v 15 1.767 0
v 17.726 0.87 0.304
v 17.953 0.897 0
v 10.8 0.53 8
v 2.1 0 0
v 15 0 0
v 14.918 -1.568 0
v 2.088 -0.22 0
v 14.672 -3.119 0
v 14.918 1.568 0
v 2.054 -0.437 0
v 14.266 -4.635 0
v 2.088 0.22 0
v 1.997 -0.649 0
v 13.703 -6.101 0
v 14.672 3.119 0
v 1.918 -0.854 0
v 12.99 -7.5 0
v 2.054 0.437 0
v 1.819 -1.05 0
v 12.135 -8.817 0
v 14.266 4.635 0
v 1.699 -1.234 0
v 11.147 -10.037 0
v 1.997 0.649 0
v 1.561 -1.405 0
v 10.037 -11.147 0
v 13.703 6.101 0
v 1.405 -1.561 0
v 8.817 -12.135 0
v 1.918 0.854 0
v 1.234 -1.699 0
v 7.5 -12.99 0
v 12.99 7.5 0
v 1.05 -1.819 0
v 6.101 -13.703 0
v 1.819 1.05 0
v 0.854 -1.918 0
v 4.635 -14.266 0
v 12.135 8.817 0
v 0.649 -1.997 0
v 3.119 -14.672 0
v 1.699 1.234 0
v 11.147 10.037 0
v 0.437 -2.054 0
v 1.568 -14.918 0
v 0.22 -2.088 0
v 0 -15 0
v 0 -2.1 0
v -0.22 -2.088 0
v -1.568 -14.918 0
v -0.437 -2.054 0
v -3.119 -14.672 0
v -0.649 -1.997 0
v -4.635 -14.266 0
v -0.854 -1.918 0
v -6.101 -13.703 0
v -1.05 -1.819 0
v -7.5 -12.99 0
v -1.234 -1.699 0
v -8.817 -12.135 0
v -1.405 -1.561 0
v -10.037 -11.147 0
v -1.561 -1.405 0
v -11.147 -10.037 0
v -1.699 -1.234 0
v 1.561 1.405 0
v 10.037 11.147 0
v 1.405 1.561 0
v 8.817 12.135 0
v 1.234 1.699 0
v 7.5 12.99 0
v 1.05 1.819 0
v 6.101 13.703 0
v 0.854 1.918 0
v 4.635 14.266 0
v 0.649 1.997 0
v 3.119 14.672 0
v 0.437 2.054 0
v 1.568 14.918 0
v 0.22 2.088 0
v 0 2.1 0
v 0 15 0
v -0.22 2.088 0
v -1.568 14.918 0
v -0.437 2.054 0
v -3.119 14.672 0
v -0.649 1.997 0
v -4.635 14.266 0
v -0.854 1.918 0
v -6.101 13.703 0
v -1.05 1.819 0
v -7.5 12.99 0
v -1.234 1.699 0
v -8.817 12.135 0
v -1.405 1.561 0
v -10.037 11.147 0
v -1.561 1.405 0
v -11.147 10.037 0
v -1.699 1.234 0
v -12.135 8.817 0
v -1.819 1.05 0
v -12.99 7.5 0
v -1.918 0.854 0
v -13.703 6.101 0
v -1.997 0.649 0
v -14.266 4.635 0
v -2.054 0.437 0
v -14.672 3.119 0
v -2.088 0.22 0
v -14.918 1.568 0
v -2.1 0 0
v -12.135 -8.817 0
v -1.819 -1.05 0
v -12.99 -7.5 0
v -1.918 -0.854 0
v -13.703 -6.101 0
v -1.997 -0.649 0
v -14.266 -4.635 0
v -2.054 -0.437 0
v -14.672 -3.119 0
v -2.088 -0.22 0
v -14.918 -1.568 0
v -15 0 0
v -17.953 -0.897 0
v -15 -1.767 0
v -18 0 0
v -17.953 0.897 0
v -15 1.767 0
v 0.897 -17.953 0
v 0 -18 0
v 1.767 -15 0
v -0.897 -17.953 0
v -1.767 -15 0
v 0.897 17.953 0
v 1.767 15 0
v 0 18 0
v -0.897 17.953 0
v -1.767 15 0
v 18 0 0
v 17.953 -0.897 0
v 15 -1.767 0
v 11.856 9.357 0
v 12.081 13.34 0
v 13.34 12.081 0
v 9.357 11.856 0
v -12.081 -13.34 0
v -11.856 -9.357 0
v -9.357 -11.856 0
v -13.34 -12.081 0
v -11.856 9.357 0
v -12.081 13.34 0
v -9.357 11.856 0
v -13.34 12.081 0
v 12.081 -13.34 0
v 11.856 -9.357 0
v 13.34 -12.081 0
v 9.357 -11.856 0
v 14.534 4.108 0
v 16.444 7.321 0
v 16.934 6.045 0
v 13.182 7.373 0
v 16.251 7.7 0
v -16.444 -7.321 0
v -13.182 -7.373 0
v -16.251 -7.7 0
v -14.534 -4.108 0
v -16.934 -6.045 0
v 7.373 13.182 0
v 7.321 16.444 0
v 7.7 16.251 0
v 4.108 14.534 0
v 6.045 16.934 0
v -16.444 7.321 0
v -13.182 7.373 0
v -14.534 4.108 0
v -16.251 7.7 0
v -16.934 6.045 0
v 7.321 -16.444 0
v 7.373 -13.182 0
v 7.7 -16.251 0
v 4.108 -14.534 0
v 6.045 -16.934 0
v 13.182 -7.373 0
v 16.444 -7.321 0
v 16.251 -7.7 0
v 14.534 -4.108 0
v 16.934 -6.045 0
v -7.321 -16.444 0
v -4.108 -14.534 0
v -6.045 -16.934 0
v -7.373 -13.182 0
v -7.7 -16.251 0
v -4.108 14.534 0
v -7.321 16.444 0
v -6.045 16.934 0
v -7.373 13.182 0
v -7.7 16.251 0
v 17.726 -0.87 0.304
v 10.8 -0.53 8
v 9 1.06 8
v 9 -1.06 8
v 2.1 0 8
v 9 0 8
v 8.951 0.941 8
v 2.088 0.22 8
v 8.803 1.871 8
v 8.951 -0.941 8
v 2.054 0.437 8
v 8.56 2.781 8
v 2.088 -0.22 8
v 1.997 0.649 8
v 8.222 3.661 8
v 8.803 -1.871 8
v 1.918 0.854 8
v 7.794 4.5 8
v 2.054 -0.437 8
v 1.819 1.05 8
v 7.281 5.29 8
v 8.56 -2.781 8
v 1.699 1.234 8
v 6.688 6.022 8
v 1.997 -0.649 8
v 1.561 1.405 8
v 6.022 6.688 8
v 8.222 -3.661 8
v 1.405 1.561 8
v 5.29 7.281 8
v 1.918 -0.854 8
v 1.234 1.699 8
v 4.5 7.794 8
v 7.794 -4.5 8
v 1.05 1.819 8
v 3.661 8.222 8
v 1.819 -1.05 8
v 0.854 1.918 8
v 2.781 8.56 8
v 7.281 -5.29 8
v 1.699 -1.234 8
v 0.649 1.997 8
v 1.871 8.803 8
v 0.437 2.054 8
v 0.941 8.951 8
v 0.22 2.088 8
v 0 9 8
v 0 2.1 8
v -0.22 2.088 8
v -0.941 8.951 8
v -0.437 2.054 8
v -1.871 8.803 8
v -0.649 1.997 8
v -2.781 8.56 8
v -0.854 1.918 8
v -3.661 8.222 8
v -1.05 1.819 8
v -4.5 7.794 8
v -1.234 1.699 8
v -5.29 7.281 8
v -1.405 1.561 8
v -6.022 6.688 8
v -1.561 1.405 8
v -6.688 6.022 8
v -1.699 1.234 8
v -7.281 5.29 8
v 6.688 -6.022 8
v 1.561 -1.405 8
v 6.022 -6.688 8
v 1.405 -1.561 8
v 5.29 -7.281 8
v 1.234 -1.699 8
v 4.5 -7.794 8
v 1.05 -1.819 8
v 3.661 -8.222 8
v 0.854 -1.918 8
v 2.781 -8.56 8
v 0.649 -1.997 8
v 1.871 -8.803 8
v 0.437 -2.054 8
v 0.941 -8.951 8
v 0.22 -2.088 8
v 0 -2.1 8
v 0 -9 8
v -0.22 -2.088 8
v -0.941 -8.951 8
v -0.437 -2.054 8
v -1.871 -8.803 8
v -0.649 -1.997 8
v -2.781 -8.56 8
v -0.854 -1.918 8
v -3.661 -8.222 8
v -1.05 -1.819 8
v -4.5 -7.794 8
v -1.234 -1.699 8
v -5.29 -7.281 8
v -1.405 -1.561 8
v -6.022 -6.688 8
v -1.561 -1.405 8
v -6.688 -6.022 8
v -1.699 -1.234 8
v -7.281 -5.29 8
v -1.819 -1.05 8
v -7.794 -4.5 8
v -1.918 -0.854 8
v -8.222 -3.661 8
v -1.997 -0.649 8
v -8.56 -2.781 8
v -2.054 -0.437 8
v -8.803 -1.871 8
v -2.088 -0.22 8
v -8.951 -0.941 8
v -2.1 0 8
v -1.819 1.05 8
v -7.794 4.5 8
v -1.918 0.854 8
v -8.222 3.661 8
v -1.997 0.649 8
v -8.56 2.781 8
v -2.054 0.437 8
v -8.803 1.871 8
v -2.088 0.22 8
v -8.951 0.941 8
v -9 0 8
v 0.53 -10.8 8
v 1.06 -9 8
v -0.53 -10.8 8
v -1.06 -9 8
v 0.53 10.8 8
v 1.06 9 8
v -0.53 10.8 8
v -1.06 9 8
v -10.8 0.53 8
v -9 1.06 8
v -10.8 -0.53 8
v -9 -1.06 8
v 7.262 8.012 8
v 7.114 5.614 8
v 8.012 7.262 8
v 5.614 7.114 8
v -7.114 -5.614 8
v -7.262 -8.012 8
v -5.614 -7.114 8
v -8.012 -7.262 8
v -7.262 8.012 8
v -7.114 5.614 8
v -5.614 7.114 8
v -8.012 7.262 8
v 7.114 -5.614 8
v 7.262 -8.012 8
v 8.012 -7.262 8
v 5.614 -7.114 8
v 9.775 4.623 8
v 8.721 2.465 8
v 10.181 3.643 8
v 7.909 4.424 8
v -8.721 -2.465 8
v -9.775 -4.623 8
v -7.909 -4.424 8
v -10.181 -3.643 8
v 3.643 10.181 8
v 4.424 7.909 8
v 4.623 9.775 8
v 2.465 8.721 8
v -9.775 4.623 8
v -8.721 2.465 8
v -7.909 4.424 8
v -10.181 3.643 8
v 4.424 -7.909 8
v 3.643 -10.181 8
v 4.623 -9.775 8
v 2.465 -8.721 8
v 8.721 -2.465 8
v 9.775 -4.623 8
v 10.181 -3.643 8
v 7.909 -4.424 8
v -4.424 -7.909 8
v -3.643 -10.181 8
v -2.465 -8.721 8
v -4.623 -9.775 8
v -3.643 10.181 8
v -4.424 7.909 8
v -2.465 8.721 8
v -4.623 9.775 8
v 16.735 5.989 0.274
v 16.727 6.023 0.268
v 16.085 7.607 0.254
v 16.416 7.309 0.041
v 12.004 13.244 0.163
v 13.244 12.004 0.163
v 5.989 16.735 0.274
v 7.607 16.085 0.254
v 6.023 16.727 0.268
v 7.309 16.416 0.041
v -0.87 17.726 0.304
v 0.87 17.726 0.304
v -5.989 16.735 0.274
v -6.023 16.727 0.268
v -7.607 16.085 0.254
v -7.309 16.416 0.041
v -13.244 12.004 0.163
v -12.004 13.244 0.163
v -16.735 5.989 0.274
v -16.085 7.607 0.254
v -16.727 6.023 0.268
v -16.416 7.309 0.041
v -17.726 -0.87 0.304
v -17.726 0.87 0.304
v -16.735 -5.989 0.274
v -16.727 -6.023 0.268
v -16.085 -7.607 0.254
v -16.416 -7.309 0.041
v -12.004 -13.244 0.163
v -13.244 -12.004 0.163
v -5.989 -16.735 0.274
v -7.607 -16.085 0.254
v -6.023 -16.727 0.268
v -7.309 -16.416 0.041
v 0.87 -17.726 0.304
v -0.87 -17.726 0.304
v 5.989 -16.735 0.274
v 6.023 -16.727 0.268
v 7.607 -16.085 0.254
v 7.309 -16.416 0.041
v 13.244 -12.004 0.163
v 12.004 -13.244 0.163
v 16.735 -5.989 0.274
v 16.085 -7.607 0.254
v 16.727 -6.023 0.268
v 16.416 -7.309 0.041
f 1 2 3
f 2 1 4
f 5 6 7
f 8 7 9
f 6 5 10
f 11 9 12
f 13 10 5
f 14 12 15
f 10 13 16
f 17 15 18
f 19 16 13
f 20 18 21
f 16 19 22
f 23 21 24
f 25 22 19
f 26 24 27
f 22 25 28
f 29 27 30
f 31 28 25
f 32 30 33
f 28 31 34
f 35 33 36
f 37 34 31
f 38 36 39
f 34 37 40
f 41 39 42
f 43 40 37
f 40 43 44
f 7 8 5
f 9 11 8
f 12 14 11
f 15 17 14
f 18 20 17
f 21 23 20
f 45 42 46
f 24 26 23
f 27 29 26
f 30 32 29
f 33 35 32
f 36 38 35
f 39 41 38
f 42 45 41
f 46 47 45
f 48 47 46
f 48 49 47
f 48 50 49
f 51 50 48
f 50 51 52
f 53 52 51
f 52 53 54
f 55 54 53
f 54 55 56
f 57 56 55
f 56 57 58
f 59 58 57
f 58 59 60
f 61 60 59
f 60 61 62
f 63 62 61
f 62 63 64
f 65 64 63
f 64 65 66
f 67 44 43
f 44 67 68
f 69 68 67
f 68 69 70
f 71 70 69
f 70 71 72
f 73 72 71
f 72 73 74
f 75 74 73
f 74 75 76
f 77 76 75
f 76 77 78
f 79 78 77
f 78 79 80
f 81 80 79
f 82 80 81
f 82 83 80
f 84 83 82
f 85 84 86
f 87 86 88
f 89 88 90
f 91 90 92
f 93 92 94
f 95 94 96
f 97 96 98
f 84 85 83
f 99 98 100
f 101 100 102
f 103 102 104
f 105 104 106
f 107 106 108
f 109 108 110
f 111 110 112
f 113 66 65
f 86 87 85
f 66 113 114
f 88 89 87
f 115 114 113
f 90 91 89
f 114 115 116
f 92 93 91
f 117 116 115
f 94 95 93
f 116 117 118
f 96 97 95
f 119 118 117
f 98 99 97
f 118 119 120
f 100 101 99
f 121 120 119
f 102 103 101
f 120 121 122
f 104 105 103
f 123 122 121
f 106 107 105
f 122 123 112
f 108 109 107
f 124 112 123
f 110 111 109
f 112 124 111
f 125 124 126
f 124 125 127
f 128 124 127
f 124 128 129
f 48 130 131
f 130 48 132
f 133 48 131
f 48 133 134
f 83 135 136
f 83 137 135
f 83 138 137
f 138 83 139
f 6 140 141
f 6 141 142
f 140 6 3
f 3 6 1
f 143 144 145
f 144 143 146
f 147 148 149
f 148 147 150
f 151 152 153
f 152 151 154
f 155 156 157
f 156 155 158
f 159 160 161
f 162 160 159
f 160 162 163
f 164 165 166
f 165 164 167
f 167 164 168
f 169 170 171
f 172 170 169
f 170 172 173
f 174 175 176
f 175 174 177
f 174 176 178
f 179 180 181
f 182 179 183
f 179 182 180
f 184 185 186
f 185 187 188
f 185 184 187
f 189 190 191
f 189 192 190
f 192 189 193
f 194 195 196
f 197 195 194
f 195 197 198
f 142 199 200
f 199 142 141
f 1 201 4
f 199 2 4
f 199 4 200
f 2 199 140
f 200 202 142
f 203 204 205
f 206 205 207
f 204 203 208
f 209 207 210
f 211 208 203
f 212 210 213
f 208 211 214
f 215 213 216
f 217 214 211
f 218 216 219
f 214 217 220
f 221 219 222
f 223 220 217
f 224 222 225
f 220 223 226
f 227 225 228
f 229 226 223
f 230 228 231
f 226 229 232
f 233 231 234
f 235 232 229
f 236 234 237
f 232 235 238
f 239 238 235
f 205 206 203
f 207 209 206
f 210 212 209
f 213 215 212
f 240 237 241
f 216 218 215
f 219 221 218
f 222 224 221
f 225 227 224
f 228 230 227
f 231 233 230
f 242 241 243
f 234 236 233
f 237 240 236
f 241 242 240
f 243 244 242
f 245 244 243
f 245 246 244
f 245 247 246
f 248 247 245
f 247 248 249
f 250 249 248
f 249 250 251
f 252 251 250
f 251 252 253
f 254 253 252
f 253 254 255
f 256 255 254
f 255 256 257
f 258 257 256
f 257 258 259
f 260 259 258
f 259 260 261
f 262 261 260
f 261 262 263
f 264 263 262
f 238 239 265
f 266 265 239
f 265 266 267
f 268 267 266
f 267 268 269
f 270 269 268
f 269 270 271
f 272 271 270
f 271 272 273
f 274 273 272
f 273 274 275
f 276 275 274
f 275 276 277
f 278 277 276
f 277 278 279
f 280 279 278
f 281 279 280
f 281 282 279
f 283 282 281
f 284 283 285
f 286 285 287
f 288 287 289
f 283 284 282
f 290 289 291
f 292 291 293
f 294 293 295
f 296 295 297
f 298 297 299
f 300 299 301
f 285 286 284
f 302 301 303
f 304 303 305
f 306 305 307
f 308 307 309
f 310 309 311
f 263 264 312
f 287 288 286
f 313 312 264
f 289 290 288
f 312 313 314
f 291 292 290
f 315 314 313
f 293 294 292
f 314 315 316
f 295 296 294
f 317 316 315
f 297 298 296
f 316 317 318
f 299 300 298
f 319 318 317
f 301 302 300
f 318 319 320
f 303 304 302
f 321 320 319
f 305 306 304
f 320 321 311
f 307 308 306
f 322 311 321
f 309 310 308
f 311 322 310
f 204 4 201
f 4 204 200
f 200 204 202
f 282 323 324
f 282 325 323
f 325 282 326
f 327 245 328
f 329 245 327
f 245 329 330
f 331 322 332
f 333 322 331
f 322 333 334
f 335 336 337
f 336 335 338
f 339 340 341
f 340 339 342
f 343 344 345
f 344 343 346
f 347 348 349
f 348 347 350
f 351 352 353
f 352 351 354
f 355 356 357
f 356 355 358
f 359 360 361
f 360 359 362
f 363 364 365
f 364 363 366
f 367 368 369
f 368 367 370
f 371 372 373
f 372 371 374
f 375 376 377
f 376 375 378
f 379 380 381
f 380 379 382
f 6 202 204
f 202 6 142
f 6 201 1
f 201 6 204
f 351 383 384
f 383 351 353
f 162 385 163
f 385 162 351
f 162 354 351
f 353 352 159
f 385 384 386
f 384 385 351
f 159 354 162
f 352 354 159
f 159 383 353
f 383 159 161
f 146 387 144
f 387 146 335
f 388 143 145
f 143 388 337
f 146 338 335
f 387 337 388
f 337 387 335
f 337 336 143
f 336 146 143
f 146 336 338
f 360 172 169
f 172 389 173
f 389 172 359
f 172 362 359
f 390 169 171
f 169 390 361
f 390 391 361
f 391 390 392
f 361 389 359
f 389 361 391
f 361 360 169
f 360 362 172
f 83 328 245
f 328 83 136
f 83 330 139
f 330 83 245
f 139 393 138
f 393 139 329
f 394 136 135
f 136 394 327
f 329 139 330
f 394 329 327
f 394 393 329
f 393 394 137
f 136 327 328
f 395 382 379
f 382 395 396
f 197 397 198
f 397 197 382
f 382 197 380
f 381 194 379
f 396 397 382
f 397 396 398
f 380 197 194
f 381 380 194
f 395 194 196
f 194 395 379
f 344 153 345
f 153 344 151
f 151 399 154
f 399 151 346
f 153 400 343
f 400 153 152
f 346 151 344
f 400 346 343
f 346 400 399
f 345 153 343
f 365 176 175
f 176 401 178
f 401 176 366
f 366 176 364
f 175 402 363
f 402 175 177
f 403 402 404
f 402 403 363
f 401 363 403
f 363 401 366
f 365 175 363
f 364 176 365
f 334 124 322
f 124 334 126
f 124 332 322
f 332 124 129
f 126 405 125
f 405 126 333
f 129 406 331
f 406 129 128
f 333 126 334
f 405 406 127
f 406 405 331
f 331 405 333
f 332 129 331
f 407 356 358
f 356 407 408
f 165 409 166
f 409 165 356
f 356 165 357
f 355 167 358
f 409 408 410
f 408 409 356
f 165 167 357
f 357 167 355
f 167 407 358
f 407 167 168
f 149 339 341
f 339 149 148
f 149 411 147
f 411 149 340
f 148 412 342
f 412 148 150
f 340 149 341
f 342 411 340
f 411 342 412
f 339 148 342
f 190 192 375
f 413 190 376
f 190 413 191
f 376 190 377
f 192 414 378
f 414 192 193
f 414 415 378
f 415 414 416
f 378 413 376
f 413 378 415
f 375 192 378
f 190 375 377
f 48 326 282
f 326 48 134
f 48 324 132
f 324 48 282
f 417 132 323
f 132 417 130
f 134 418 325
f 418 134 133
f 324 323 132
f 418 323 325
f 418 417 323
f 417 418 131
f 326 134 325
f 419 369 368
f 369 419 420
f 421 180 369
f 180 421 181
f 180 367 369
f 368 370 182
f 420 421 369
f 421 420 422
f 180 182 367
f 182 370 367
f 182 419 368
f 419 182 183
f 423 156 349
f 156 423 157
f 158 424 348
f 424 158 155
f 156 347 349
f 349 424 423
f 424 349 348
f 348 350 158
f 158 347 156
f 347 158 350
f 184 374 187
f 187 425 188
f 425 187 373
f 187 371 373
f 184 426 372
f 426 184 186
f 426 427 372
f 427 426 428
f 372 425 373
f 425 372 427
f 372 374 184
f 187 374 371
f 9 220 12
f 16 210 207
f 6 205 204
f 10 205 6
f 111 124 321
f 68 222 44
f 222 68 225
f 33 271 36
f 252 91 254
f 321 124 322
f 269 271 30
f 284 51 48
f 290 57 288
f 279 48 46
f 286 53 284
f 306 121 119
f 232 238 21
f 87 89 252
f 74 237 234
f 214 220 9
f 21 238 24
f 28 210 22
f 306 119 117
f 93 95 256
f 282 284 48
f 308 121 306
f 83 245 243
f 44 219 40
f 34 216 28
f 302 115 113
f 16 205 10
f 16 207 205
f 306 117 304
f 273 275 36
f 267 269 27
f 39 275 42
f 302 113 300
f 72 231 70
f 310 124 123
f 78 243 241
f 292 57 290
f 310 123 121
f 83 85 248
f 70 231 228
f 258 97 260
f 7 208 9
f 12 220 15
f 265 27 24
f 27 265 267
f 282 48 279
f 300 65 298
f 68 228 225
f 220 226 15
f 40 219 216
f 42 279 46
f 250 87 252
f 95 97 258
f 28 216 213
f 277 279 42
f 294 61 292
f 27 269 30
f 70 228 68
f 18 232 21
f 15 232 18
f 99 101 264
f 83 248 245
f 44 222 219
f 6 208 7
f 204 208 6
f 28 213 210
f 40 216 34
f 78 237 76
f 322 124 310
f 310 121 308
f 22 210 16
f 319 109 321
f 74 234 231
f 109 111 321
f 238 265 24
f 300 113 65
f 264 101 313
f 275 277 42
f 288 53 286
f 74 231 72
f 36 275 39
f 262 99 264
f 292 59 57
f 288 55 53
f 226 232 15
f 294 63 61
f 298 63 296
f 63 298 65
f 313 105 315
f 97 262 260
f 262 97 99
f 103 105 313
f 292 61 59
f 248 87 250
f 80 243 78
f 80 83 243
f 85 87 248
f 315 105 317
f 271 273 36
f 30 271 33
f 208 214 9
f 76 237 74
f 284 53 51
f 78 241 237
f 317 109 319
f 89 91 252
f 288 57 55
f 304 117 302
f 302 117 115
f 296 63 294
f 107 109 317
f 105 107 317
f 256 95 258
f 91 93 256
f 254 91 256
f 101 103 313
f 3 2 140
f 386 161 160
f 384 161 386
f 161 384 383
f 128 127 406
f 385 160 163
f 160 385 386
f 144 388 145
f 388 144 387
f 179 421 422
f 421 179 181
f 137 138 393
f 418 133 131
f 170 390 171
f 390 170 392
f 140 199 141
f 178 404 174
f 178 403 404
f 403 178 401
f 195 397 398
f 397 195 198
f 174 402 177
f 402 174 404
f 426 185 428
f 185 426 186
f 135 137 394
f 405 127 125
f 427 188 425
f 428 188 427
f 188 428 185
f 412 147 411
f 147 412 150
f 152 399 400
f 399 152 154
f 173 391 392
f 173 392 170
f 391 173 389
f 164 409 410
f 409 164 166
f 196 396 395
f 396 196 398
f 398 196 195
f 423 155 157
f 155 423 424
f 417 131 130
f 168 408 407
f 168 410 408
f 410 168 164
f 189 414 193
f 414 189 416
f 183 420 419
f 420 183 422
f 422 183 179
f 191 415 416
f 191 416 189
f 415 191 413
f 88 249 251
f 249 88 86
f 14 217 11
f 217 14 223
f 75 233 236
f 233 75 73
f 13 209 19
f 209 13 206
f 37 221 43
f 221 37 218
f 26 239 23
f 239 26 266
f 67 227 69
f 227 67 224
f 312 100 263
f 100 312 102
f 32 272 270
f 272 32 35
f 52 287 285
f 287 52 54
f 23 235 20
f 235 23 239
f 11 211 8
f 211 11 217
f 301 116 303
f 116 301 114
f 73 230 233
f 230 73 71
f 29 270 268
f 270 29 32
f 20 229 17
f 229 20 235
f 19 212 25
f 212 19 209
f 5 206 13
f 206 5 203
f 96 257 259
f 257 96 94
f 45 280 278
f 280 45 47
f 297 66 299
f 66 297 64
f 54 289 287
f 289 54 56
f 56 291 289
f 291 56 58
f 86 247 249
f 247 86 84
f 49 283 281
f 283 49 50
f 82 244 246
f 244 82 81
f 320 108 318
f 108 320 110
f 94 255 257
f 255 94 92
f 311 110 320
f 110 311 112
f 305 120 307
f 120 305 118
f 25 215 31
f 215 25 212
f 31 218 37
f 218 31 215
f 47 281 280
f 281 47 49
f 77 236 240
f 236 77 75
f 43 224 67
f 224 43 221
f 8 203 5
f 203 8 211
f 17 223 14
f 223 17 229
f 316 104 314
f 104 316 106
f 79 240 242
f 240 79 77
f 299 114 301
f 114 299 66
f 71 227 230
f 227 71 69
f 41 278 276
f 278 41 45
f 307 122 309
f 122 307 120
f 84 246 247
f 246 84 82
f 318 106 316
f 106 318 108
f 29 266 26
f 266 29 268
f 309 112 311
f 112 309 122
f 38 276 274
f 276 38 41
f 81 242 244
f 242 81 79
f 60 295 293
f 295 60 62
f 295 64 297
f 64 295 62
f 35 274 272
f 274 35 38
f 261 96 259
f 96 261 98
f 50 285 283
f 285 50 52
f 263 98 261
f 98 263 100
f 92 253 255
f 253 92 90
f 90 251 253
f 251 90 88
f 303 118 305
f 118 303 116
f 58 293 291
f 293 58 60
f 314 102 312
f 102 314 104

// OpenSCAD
tooth_height = 3;
tooth_count = 16;
tooth_angle = 20;
face_width = 8;
shaft_diameter = 4.2;
gear_diameter = 30;
gear_depth = 12;

upper_diameter = gear_diameter;
lower_diameter = gear_diameter - gear_depth;

$fn = 60;

module bavel_tooth() {
    base_width = PI * upper_diameter / tooth_count * 0.6;
    top_width = PI * upper_diameter / tooth_count * 0.3;
    diameter_ratio = lower_diameter / upper_diameter;

    translate([0, 0, 0])
    linear_extrude(height = face_width, scale = diameter_ratio, convexity = 10)
    translate([upper_diameter / 2, 0, 0])
    polygon(points = [
        [0, -base_width / 2],
        [tooth_height, -top_width / 2],
        [tooth_height, top_width / 2],
        [0, base_width / 2],
    ]);
}

difference() {
    intersection() {
        union() {
            cylinder(d1 = upper_diameter, d2 = lower_diameter, h = face_width);

            for (i = [0 : tooth_count - 1]) {
                rotate([0, 0, i * (360 / tooth_count)])
                    bavel_tooth();
            }
        }

        cylinder(d1 = upper_diameter + tooth_height * 2, d2 = lower_diameter + tooth_height * 2, h = face_width);
    }

    translate([0, 0, -1])
        cylinder(d = shaft_diameter, h = face_width + 2);
}
